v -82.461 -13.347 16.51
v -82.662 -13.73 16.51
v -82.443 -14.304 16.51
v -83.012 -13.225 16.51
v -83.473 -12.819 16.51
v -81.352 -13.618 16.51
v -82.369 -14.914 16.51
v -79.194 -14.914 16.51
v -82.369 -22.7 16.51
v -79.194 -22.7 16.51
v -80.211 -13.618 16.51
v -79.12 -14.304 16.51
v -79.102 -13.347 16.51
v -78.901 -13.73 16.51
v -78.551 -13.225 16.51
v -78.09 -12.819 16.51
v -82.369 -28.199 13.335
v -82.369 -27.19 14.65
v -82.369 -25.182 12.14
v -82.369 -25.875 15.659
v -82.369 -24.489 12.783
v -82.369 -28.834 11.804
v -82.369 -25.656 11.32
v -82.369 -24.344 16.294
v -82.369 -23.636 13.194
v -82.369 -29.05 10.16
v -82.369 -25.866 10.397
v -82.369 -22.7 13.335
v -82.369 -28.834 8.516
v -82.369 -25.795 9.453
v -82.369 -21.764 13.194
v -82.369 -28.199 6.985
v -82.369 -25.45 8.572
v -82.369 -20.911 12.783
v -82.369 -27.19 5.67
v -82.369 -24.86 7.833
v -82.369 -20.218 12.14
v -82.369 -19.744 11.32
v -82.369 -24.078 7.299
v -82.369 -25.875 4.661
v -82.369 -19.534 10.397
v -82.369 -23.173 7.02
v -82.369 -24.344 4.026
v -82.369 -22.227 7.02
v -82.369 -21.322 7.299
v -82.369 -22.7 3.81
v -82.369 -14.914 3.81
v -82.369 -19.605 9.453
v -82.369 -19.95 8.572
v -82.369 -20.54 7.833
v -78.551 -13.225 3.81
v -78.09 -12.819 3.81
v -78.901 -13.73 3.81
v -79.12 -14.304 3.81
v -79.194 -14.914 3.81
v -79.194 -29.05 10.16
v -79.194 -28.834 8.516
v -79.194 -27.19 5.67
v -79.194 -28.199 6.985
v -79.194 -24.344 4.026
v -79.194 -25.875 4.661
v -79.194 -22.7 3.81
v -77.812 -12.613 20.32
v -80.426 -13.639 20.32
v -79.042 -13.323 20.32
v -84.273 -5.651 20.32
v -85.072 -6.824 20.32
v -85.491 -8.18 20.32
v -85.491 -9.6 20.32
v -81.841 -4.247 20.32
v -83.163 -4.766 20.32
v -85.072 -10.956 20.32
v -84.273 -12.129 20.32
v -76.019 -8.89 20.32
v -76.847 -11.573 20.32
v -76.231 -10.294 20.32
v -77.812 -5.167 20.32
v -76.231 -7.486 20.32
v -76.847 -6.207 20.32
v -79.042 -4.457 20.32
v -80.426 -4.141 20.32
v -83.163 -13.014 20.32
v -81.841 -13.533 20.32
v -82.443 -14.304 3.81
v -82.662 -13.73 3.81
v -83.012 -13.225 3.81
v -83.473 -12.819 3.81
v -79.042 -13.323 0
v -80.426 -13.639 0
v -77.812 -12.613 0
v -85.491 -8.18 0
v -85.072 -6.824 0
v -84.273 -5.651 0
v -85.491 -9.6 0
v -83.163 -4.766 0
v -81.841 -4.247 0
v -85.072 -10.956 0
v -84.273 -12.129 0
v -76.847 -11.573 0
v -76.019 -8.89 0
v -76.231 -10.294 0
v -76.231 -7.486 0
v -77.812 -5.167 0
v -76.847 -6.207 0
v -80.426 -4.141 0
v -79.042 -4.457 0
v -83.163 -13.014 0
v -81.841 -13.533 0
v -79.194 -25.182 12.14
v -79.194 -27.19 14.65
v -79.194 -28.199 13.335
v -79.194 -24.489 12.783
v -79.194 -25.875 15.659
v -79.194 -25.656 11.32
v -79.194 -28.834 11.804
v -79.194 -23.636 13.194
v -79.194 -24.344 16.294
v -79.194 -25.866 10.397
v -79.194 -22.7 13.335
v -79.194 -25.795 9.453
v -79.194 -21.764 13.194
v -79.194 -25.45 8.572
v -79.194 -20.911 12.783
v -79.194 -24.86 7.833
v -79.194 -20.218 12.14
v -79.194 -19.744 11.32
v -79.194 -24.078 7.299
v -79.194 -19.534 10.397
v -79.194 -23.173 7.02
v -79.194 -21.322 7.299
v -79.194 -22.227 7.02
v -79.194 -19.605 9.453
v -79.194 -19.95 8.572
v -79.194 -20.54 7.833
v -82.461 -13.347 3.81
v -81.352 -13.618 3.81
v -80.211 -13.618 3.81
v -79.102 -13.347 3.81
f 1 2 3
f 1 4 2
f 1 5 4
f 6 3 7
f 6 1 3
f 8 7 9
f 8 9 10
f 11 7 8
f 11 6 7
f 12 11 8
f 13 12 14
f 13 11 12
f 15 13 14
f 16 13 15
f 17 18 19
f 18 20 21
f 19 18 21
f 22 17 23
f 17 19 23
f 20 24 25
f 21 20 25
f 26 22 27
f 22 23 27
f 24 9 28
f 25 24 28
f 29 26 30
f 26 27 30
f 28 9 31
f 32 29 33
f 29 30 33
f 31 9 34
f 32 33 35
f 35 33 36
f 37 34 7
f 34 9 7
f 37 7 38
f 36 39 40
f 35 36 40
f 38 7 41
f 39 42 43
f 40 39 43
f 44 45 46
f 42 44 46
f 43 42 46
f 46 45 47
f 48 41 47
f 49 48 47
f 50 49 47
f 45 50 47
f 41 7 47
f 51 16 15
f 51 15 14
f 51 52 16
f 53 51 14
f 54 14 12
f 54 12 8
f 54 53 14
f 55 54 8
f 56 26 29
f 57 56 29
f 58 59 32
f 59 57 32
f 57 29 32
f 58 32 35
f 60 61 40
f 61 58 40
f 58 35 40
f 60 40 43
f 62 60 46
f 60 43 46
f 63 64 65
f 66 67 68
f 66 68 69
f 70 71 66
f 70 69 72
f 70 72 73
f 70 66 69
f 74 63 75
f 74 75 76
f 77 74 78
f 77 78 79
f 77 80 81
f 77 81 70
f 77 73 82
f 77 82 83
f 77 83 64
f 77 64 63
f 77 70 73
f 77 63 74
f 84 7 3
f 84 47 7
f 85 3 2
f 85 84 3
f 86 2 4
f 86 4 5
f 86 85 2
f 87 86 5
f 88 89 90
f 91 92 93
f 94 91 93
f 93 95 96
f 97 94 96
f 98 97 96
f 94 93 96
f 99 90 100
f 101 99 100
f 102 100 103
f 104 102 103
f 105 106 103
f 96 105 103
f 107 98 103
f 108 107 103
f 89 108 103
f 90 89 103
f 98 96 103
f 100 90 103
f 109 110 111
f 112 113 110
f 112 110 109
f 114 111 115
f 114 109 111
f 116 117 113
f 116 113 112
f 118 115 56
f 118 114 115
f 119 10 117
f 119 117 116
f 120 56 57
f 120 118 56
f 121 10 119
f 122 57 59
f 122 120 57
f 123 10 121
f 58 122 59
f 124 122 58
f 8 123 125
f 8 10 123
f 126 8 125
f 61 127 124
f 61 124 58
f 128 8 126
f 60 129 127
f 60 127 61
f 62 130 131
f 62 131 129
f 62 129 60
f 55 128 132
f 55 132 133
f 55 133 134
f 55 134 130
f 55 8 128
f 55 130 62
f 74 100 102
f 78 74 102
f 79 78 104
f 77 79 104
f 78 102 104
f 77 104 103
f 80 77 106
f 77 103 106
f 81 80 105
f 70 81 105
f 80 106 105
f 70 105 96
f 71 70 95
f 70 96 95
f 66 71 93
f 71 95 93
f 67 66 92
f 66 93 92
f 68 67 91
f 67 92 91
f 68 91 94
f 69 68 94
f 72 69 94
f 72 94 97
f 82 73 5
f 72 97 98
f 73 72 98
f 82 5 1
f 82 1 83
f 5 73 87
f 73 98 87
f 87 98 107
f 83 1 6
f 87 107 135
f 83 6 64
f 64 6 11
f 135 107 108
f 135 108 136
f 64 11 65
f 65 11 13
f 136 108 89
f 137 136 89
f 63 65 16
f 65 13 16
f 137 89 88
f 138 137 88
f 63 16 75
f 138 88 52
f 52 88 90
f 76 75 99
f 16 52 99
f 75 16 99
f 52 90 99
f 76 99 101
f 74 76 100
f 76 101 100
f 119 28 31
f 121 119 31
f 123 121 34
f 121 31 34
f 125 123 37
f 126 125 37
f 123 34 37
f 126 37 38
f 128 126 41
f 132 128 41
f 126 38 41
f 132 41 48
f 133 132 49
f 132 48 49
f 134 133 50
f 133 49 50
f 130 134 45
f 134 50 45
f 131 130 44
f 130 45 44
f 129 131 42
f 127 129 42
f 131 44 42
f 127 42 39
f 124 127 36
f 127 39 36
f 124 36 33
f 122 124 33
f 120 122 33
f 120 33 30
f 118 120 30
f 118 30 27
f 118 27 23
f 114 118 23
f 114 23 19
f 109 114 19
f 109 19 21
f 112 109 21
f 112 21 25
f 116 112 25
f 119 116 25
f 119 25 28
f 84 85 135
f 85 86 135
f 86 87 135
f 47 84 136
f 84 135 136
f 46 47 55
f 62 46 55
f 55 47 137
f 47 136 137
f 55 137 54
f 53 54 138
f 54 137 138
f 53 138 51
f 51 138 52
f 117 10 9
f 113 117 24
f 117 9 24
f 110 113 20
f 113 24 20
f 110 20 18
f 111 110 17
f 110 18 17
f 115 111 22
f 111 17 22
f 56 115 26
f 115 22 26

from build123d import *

# Parameters (mm, degrees)
SKETCH1_R           = 4.7625
BOSS_EXTRUDE1_DEPTH = 20.32
SKETCH2_W           = 3.175
SKETCH2_H           = 12.7
BOSS_EXTRUDE2_DEPTH = 19.05
CUT_EXTRUDE1_DEPTH  = 37.015654929
SKETCH4_R           = 3.175
CUT_EXTRUDE2_DEPTH  = 37.015654929
FILLET1_R           = 2.54


with BuildPart() as part:
    # Sketch1 → Boss-Extrude1 (new body)
    with BuildSketch(Plane.XY):
        with Locations((-80.781588965, -8.89)):
            Circle(SKETCH1_R)
    extrude(amount=BOSS_EXTRUDE1_DEPTH)

    # Sketch2 → Boss-Extrude2 (add)
    with BuildSketch(Plane(origin=(0, -10, 0), x_dir=(1, 0, 0), z_dir=(0, 1, 0))):
        with Locations((-80.781588965, -10.16)):
            Rectangle(SKETCH2_W, SKETCH2_H)
    extrude(amount=-BOSS_EXTRUDE2_DEPTH)

    # Sketch3 → Cut-Extrude1 (cut, through all)
    with BuildSketch(Plane.ZY.offset(82.369088965)):
        with BuildLine():
            ThreePointArc((16.51, -22.7), (14.650128061, -27.190128061), (10.16, -29.05))
            Line((10.16, -29.05), (16.51, -29.05))
            Line((16.51, -29.05), (16.51, -22.7))
        make_face()
        with BuildLine():
            ThreePointArc((10.16, -29.05), (5.669871939, -27.190128061), (3.81, -22.7))
            Line((3.81, -22.7), (3.81, -29.05))
            Line((3.81, -29.05), (10.16, -29.05))
        make_face()
    extrude(amount=-CUT_EXTRUDE1_DEPTH, mode=Mode.SUBTRACT)

    # Sketch4 → Cut-Extrude2 (cut, through all)
    with BuildSketch(Plane.ZY.offset(82.369088965)):
        with Locations((10.16, -22.7)):
            Circle(SKETCH4_R)
    extrude(amount=-CUT_EXTRUDE2_DEPTH, mode=Mode.SUBTRACT)

    # Fillet1
    fillet1_edges = [part.edges().sort_by_distance(p)[0] for p in [
        (-82.369088965, -13.380128061, 10.16),
        (-79.194088965, -13.380128061, 10.16),
    ]]
    fillet(fillet1_edges, radius=FILLET1_R)


solid = part.part
